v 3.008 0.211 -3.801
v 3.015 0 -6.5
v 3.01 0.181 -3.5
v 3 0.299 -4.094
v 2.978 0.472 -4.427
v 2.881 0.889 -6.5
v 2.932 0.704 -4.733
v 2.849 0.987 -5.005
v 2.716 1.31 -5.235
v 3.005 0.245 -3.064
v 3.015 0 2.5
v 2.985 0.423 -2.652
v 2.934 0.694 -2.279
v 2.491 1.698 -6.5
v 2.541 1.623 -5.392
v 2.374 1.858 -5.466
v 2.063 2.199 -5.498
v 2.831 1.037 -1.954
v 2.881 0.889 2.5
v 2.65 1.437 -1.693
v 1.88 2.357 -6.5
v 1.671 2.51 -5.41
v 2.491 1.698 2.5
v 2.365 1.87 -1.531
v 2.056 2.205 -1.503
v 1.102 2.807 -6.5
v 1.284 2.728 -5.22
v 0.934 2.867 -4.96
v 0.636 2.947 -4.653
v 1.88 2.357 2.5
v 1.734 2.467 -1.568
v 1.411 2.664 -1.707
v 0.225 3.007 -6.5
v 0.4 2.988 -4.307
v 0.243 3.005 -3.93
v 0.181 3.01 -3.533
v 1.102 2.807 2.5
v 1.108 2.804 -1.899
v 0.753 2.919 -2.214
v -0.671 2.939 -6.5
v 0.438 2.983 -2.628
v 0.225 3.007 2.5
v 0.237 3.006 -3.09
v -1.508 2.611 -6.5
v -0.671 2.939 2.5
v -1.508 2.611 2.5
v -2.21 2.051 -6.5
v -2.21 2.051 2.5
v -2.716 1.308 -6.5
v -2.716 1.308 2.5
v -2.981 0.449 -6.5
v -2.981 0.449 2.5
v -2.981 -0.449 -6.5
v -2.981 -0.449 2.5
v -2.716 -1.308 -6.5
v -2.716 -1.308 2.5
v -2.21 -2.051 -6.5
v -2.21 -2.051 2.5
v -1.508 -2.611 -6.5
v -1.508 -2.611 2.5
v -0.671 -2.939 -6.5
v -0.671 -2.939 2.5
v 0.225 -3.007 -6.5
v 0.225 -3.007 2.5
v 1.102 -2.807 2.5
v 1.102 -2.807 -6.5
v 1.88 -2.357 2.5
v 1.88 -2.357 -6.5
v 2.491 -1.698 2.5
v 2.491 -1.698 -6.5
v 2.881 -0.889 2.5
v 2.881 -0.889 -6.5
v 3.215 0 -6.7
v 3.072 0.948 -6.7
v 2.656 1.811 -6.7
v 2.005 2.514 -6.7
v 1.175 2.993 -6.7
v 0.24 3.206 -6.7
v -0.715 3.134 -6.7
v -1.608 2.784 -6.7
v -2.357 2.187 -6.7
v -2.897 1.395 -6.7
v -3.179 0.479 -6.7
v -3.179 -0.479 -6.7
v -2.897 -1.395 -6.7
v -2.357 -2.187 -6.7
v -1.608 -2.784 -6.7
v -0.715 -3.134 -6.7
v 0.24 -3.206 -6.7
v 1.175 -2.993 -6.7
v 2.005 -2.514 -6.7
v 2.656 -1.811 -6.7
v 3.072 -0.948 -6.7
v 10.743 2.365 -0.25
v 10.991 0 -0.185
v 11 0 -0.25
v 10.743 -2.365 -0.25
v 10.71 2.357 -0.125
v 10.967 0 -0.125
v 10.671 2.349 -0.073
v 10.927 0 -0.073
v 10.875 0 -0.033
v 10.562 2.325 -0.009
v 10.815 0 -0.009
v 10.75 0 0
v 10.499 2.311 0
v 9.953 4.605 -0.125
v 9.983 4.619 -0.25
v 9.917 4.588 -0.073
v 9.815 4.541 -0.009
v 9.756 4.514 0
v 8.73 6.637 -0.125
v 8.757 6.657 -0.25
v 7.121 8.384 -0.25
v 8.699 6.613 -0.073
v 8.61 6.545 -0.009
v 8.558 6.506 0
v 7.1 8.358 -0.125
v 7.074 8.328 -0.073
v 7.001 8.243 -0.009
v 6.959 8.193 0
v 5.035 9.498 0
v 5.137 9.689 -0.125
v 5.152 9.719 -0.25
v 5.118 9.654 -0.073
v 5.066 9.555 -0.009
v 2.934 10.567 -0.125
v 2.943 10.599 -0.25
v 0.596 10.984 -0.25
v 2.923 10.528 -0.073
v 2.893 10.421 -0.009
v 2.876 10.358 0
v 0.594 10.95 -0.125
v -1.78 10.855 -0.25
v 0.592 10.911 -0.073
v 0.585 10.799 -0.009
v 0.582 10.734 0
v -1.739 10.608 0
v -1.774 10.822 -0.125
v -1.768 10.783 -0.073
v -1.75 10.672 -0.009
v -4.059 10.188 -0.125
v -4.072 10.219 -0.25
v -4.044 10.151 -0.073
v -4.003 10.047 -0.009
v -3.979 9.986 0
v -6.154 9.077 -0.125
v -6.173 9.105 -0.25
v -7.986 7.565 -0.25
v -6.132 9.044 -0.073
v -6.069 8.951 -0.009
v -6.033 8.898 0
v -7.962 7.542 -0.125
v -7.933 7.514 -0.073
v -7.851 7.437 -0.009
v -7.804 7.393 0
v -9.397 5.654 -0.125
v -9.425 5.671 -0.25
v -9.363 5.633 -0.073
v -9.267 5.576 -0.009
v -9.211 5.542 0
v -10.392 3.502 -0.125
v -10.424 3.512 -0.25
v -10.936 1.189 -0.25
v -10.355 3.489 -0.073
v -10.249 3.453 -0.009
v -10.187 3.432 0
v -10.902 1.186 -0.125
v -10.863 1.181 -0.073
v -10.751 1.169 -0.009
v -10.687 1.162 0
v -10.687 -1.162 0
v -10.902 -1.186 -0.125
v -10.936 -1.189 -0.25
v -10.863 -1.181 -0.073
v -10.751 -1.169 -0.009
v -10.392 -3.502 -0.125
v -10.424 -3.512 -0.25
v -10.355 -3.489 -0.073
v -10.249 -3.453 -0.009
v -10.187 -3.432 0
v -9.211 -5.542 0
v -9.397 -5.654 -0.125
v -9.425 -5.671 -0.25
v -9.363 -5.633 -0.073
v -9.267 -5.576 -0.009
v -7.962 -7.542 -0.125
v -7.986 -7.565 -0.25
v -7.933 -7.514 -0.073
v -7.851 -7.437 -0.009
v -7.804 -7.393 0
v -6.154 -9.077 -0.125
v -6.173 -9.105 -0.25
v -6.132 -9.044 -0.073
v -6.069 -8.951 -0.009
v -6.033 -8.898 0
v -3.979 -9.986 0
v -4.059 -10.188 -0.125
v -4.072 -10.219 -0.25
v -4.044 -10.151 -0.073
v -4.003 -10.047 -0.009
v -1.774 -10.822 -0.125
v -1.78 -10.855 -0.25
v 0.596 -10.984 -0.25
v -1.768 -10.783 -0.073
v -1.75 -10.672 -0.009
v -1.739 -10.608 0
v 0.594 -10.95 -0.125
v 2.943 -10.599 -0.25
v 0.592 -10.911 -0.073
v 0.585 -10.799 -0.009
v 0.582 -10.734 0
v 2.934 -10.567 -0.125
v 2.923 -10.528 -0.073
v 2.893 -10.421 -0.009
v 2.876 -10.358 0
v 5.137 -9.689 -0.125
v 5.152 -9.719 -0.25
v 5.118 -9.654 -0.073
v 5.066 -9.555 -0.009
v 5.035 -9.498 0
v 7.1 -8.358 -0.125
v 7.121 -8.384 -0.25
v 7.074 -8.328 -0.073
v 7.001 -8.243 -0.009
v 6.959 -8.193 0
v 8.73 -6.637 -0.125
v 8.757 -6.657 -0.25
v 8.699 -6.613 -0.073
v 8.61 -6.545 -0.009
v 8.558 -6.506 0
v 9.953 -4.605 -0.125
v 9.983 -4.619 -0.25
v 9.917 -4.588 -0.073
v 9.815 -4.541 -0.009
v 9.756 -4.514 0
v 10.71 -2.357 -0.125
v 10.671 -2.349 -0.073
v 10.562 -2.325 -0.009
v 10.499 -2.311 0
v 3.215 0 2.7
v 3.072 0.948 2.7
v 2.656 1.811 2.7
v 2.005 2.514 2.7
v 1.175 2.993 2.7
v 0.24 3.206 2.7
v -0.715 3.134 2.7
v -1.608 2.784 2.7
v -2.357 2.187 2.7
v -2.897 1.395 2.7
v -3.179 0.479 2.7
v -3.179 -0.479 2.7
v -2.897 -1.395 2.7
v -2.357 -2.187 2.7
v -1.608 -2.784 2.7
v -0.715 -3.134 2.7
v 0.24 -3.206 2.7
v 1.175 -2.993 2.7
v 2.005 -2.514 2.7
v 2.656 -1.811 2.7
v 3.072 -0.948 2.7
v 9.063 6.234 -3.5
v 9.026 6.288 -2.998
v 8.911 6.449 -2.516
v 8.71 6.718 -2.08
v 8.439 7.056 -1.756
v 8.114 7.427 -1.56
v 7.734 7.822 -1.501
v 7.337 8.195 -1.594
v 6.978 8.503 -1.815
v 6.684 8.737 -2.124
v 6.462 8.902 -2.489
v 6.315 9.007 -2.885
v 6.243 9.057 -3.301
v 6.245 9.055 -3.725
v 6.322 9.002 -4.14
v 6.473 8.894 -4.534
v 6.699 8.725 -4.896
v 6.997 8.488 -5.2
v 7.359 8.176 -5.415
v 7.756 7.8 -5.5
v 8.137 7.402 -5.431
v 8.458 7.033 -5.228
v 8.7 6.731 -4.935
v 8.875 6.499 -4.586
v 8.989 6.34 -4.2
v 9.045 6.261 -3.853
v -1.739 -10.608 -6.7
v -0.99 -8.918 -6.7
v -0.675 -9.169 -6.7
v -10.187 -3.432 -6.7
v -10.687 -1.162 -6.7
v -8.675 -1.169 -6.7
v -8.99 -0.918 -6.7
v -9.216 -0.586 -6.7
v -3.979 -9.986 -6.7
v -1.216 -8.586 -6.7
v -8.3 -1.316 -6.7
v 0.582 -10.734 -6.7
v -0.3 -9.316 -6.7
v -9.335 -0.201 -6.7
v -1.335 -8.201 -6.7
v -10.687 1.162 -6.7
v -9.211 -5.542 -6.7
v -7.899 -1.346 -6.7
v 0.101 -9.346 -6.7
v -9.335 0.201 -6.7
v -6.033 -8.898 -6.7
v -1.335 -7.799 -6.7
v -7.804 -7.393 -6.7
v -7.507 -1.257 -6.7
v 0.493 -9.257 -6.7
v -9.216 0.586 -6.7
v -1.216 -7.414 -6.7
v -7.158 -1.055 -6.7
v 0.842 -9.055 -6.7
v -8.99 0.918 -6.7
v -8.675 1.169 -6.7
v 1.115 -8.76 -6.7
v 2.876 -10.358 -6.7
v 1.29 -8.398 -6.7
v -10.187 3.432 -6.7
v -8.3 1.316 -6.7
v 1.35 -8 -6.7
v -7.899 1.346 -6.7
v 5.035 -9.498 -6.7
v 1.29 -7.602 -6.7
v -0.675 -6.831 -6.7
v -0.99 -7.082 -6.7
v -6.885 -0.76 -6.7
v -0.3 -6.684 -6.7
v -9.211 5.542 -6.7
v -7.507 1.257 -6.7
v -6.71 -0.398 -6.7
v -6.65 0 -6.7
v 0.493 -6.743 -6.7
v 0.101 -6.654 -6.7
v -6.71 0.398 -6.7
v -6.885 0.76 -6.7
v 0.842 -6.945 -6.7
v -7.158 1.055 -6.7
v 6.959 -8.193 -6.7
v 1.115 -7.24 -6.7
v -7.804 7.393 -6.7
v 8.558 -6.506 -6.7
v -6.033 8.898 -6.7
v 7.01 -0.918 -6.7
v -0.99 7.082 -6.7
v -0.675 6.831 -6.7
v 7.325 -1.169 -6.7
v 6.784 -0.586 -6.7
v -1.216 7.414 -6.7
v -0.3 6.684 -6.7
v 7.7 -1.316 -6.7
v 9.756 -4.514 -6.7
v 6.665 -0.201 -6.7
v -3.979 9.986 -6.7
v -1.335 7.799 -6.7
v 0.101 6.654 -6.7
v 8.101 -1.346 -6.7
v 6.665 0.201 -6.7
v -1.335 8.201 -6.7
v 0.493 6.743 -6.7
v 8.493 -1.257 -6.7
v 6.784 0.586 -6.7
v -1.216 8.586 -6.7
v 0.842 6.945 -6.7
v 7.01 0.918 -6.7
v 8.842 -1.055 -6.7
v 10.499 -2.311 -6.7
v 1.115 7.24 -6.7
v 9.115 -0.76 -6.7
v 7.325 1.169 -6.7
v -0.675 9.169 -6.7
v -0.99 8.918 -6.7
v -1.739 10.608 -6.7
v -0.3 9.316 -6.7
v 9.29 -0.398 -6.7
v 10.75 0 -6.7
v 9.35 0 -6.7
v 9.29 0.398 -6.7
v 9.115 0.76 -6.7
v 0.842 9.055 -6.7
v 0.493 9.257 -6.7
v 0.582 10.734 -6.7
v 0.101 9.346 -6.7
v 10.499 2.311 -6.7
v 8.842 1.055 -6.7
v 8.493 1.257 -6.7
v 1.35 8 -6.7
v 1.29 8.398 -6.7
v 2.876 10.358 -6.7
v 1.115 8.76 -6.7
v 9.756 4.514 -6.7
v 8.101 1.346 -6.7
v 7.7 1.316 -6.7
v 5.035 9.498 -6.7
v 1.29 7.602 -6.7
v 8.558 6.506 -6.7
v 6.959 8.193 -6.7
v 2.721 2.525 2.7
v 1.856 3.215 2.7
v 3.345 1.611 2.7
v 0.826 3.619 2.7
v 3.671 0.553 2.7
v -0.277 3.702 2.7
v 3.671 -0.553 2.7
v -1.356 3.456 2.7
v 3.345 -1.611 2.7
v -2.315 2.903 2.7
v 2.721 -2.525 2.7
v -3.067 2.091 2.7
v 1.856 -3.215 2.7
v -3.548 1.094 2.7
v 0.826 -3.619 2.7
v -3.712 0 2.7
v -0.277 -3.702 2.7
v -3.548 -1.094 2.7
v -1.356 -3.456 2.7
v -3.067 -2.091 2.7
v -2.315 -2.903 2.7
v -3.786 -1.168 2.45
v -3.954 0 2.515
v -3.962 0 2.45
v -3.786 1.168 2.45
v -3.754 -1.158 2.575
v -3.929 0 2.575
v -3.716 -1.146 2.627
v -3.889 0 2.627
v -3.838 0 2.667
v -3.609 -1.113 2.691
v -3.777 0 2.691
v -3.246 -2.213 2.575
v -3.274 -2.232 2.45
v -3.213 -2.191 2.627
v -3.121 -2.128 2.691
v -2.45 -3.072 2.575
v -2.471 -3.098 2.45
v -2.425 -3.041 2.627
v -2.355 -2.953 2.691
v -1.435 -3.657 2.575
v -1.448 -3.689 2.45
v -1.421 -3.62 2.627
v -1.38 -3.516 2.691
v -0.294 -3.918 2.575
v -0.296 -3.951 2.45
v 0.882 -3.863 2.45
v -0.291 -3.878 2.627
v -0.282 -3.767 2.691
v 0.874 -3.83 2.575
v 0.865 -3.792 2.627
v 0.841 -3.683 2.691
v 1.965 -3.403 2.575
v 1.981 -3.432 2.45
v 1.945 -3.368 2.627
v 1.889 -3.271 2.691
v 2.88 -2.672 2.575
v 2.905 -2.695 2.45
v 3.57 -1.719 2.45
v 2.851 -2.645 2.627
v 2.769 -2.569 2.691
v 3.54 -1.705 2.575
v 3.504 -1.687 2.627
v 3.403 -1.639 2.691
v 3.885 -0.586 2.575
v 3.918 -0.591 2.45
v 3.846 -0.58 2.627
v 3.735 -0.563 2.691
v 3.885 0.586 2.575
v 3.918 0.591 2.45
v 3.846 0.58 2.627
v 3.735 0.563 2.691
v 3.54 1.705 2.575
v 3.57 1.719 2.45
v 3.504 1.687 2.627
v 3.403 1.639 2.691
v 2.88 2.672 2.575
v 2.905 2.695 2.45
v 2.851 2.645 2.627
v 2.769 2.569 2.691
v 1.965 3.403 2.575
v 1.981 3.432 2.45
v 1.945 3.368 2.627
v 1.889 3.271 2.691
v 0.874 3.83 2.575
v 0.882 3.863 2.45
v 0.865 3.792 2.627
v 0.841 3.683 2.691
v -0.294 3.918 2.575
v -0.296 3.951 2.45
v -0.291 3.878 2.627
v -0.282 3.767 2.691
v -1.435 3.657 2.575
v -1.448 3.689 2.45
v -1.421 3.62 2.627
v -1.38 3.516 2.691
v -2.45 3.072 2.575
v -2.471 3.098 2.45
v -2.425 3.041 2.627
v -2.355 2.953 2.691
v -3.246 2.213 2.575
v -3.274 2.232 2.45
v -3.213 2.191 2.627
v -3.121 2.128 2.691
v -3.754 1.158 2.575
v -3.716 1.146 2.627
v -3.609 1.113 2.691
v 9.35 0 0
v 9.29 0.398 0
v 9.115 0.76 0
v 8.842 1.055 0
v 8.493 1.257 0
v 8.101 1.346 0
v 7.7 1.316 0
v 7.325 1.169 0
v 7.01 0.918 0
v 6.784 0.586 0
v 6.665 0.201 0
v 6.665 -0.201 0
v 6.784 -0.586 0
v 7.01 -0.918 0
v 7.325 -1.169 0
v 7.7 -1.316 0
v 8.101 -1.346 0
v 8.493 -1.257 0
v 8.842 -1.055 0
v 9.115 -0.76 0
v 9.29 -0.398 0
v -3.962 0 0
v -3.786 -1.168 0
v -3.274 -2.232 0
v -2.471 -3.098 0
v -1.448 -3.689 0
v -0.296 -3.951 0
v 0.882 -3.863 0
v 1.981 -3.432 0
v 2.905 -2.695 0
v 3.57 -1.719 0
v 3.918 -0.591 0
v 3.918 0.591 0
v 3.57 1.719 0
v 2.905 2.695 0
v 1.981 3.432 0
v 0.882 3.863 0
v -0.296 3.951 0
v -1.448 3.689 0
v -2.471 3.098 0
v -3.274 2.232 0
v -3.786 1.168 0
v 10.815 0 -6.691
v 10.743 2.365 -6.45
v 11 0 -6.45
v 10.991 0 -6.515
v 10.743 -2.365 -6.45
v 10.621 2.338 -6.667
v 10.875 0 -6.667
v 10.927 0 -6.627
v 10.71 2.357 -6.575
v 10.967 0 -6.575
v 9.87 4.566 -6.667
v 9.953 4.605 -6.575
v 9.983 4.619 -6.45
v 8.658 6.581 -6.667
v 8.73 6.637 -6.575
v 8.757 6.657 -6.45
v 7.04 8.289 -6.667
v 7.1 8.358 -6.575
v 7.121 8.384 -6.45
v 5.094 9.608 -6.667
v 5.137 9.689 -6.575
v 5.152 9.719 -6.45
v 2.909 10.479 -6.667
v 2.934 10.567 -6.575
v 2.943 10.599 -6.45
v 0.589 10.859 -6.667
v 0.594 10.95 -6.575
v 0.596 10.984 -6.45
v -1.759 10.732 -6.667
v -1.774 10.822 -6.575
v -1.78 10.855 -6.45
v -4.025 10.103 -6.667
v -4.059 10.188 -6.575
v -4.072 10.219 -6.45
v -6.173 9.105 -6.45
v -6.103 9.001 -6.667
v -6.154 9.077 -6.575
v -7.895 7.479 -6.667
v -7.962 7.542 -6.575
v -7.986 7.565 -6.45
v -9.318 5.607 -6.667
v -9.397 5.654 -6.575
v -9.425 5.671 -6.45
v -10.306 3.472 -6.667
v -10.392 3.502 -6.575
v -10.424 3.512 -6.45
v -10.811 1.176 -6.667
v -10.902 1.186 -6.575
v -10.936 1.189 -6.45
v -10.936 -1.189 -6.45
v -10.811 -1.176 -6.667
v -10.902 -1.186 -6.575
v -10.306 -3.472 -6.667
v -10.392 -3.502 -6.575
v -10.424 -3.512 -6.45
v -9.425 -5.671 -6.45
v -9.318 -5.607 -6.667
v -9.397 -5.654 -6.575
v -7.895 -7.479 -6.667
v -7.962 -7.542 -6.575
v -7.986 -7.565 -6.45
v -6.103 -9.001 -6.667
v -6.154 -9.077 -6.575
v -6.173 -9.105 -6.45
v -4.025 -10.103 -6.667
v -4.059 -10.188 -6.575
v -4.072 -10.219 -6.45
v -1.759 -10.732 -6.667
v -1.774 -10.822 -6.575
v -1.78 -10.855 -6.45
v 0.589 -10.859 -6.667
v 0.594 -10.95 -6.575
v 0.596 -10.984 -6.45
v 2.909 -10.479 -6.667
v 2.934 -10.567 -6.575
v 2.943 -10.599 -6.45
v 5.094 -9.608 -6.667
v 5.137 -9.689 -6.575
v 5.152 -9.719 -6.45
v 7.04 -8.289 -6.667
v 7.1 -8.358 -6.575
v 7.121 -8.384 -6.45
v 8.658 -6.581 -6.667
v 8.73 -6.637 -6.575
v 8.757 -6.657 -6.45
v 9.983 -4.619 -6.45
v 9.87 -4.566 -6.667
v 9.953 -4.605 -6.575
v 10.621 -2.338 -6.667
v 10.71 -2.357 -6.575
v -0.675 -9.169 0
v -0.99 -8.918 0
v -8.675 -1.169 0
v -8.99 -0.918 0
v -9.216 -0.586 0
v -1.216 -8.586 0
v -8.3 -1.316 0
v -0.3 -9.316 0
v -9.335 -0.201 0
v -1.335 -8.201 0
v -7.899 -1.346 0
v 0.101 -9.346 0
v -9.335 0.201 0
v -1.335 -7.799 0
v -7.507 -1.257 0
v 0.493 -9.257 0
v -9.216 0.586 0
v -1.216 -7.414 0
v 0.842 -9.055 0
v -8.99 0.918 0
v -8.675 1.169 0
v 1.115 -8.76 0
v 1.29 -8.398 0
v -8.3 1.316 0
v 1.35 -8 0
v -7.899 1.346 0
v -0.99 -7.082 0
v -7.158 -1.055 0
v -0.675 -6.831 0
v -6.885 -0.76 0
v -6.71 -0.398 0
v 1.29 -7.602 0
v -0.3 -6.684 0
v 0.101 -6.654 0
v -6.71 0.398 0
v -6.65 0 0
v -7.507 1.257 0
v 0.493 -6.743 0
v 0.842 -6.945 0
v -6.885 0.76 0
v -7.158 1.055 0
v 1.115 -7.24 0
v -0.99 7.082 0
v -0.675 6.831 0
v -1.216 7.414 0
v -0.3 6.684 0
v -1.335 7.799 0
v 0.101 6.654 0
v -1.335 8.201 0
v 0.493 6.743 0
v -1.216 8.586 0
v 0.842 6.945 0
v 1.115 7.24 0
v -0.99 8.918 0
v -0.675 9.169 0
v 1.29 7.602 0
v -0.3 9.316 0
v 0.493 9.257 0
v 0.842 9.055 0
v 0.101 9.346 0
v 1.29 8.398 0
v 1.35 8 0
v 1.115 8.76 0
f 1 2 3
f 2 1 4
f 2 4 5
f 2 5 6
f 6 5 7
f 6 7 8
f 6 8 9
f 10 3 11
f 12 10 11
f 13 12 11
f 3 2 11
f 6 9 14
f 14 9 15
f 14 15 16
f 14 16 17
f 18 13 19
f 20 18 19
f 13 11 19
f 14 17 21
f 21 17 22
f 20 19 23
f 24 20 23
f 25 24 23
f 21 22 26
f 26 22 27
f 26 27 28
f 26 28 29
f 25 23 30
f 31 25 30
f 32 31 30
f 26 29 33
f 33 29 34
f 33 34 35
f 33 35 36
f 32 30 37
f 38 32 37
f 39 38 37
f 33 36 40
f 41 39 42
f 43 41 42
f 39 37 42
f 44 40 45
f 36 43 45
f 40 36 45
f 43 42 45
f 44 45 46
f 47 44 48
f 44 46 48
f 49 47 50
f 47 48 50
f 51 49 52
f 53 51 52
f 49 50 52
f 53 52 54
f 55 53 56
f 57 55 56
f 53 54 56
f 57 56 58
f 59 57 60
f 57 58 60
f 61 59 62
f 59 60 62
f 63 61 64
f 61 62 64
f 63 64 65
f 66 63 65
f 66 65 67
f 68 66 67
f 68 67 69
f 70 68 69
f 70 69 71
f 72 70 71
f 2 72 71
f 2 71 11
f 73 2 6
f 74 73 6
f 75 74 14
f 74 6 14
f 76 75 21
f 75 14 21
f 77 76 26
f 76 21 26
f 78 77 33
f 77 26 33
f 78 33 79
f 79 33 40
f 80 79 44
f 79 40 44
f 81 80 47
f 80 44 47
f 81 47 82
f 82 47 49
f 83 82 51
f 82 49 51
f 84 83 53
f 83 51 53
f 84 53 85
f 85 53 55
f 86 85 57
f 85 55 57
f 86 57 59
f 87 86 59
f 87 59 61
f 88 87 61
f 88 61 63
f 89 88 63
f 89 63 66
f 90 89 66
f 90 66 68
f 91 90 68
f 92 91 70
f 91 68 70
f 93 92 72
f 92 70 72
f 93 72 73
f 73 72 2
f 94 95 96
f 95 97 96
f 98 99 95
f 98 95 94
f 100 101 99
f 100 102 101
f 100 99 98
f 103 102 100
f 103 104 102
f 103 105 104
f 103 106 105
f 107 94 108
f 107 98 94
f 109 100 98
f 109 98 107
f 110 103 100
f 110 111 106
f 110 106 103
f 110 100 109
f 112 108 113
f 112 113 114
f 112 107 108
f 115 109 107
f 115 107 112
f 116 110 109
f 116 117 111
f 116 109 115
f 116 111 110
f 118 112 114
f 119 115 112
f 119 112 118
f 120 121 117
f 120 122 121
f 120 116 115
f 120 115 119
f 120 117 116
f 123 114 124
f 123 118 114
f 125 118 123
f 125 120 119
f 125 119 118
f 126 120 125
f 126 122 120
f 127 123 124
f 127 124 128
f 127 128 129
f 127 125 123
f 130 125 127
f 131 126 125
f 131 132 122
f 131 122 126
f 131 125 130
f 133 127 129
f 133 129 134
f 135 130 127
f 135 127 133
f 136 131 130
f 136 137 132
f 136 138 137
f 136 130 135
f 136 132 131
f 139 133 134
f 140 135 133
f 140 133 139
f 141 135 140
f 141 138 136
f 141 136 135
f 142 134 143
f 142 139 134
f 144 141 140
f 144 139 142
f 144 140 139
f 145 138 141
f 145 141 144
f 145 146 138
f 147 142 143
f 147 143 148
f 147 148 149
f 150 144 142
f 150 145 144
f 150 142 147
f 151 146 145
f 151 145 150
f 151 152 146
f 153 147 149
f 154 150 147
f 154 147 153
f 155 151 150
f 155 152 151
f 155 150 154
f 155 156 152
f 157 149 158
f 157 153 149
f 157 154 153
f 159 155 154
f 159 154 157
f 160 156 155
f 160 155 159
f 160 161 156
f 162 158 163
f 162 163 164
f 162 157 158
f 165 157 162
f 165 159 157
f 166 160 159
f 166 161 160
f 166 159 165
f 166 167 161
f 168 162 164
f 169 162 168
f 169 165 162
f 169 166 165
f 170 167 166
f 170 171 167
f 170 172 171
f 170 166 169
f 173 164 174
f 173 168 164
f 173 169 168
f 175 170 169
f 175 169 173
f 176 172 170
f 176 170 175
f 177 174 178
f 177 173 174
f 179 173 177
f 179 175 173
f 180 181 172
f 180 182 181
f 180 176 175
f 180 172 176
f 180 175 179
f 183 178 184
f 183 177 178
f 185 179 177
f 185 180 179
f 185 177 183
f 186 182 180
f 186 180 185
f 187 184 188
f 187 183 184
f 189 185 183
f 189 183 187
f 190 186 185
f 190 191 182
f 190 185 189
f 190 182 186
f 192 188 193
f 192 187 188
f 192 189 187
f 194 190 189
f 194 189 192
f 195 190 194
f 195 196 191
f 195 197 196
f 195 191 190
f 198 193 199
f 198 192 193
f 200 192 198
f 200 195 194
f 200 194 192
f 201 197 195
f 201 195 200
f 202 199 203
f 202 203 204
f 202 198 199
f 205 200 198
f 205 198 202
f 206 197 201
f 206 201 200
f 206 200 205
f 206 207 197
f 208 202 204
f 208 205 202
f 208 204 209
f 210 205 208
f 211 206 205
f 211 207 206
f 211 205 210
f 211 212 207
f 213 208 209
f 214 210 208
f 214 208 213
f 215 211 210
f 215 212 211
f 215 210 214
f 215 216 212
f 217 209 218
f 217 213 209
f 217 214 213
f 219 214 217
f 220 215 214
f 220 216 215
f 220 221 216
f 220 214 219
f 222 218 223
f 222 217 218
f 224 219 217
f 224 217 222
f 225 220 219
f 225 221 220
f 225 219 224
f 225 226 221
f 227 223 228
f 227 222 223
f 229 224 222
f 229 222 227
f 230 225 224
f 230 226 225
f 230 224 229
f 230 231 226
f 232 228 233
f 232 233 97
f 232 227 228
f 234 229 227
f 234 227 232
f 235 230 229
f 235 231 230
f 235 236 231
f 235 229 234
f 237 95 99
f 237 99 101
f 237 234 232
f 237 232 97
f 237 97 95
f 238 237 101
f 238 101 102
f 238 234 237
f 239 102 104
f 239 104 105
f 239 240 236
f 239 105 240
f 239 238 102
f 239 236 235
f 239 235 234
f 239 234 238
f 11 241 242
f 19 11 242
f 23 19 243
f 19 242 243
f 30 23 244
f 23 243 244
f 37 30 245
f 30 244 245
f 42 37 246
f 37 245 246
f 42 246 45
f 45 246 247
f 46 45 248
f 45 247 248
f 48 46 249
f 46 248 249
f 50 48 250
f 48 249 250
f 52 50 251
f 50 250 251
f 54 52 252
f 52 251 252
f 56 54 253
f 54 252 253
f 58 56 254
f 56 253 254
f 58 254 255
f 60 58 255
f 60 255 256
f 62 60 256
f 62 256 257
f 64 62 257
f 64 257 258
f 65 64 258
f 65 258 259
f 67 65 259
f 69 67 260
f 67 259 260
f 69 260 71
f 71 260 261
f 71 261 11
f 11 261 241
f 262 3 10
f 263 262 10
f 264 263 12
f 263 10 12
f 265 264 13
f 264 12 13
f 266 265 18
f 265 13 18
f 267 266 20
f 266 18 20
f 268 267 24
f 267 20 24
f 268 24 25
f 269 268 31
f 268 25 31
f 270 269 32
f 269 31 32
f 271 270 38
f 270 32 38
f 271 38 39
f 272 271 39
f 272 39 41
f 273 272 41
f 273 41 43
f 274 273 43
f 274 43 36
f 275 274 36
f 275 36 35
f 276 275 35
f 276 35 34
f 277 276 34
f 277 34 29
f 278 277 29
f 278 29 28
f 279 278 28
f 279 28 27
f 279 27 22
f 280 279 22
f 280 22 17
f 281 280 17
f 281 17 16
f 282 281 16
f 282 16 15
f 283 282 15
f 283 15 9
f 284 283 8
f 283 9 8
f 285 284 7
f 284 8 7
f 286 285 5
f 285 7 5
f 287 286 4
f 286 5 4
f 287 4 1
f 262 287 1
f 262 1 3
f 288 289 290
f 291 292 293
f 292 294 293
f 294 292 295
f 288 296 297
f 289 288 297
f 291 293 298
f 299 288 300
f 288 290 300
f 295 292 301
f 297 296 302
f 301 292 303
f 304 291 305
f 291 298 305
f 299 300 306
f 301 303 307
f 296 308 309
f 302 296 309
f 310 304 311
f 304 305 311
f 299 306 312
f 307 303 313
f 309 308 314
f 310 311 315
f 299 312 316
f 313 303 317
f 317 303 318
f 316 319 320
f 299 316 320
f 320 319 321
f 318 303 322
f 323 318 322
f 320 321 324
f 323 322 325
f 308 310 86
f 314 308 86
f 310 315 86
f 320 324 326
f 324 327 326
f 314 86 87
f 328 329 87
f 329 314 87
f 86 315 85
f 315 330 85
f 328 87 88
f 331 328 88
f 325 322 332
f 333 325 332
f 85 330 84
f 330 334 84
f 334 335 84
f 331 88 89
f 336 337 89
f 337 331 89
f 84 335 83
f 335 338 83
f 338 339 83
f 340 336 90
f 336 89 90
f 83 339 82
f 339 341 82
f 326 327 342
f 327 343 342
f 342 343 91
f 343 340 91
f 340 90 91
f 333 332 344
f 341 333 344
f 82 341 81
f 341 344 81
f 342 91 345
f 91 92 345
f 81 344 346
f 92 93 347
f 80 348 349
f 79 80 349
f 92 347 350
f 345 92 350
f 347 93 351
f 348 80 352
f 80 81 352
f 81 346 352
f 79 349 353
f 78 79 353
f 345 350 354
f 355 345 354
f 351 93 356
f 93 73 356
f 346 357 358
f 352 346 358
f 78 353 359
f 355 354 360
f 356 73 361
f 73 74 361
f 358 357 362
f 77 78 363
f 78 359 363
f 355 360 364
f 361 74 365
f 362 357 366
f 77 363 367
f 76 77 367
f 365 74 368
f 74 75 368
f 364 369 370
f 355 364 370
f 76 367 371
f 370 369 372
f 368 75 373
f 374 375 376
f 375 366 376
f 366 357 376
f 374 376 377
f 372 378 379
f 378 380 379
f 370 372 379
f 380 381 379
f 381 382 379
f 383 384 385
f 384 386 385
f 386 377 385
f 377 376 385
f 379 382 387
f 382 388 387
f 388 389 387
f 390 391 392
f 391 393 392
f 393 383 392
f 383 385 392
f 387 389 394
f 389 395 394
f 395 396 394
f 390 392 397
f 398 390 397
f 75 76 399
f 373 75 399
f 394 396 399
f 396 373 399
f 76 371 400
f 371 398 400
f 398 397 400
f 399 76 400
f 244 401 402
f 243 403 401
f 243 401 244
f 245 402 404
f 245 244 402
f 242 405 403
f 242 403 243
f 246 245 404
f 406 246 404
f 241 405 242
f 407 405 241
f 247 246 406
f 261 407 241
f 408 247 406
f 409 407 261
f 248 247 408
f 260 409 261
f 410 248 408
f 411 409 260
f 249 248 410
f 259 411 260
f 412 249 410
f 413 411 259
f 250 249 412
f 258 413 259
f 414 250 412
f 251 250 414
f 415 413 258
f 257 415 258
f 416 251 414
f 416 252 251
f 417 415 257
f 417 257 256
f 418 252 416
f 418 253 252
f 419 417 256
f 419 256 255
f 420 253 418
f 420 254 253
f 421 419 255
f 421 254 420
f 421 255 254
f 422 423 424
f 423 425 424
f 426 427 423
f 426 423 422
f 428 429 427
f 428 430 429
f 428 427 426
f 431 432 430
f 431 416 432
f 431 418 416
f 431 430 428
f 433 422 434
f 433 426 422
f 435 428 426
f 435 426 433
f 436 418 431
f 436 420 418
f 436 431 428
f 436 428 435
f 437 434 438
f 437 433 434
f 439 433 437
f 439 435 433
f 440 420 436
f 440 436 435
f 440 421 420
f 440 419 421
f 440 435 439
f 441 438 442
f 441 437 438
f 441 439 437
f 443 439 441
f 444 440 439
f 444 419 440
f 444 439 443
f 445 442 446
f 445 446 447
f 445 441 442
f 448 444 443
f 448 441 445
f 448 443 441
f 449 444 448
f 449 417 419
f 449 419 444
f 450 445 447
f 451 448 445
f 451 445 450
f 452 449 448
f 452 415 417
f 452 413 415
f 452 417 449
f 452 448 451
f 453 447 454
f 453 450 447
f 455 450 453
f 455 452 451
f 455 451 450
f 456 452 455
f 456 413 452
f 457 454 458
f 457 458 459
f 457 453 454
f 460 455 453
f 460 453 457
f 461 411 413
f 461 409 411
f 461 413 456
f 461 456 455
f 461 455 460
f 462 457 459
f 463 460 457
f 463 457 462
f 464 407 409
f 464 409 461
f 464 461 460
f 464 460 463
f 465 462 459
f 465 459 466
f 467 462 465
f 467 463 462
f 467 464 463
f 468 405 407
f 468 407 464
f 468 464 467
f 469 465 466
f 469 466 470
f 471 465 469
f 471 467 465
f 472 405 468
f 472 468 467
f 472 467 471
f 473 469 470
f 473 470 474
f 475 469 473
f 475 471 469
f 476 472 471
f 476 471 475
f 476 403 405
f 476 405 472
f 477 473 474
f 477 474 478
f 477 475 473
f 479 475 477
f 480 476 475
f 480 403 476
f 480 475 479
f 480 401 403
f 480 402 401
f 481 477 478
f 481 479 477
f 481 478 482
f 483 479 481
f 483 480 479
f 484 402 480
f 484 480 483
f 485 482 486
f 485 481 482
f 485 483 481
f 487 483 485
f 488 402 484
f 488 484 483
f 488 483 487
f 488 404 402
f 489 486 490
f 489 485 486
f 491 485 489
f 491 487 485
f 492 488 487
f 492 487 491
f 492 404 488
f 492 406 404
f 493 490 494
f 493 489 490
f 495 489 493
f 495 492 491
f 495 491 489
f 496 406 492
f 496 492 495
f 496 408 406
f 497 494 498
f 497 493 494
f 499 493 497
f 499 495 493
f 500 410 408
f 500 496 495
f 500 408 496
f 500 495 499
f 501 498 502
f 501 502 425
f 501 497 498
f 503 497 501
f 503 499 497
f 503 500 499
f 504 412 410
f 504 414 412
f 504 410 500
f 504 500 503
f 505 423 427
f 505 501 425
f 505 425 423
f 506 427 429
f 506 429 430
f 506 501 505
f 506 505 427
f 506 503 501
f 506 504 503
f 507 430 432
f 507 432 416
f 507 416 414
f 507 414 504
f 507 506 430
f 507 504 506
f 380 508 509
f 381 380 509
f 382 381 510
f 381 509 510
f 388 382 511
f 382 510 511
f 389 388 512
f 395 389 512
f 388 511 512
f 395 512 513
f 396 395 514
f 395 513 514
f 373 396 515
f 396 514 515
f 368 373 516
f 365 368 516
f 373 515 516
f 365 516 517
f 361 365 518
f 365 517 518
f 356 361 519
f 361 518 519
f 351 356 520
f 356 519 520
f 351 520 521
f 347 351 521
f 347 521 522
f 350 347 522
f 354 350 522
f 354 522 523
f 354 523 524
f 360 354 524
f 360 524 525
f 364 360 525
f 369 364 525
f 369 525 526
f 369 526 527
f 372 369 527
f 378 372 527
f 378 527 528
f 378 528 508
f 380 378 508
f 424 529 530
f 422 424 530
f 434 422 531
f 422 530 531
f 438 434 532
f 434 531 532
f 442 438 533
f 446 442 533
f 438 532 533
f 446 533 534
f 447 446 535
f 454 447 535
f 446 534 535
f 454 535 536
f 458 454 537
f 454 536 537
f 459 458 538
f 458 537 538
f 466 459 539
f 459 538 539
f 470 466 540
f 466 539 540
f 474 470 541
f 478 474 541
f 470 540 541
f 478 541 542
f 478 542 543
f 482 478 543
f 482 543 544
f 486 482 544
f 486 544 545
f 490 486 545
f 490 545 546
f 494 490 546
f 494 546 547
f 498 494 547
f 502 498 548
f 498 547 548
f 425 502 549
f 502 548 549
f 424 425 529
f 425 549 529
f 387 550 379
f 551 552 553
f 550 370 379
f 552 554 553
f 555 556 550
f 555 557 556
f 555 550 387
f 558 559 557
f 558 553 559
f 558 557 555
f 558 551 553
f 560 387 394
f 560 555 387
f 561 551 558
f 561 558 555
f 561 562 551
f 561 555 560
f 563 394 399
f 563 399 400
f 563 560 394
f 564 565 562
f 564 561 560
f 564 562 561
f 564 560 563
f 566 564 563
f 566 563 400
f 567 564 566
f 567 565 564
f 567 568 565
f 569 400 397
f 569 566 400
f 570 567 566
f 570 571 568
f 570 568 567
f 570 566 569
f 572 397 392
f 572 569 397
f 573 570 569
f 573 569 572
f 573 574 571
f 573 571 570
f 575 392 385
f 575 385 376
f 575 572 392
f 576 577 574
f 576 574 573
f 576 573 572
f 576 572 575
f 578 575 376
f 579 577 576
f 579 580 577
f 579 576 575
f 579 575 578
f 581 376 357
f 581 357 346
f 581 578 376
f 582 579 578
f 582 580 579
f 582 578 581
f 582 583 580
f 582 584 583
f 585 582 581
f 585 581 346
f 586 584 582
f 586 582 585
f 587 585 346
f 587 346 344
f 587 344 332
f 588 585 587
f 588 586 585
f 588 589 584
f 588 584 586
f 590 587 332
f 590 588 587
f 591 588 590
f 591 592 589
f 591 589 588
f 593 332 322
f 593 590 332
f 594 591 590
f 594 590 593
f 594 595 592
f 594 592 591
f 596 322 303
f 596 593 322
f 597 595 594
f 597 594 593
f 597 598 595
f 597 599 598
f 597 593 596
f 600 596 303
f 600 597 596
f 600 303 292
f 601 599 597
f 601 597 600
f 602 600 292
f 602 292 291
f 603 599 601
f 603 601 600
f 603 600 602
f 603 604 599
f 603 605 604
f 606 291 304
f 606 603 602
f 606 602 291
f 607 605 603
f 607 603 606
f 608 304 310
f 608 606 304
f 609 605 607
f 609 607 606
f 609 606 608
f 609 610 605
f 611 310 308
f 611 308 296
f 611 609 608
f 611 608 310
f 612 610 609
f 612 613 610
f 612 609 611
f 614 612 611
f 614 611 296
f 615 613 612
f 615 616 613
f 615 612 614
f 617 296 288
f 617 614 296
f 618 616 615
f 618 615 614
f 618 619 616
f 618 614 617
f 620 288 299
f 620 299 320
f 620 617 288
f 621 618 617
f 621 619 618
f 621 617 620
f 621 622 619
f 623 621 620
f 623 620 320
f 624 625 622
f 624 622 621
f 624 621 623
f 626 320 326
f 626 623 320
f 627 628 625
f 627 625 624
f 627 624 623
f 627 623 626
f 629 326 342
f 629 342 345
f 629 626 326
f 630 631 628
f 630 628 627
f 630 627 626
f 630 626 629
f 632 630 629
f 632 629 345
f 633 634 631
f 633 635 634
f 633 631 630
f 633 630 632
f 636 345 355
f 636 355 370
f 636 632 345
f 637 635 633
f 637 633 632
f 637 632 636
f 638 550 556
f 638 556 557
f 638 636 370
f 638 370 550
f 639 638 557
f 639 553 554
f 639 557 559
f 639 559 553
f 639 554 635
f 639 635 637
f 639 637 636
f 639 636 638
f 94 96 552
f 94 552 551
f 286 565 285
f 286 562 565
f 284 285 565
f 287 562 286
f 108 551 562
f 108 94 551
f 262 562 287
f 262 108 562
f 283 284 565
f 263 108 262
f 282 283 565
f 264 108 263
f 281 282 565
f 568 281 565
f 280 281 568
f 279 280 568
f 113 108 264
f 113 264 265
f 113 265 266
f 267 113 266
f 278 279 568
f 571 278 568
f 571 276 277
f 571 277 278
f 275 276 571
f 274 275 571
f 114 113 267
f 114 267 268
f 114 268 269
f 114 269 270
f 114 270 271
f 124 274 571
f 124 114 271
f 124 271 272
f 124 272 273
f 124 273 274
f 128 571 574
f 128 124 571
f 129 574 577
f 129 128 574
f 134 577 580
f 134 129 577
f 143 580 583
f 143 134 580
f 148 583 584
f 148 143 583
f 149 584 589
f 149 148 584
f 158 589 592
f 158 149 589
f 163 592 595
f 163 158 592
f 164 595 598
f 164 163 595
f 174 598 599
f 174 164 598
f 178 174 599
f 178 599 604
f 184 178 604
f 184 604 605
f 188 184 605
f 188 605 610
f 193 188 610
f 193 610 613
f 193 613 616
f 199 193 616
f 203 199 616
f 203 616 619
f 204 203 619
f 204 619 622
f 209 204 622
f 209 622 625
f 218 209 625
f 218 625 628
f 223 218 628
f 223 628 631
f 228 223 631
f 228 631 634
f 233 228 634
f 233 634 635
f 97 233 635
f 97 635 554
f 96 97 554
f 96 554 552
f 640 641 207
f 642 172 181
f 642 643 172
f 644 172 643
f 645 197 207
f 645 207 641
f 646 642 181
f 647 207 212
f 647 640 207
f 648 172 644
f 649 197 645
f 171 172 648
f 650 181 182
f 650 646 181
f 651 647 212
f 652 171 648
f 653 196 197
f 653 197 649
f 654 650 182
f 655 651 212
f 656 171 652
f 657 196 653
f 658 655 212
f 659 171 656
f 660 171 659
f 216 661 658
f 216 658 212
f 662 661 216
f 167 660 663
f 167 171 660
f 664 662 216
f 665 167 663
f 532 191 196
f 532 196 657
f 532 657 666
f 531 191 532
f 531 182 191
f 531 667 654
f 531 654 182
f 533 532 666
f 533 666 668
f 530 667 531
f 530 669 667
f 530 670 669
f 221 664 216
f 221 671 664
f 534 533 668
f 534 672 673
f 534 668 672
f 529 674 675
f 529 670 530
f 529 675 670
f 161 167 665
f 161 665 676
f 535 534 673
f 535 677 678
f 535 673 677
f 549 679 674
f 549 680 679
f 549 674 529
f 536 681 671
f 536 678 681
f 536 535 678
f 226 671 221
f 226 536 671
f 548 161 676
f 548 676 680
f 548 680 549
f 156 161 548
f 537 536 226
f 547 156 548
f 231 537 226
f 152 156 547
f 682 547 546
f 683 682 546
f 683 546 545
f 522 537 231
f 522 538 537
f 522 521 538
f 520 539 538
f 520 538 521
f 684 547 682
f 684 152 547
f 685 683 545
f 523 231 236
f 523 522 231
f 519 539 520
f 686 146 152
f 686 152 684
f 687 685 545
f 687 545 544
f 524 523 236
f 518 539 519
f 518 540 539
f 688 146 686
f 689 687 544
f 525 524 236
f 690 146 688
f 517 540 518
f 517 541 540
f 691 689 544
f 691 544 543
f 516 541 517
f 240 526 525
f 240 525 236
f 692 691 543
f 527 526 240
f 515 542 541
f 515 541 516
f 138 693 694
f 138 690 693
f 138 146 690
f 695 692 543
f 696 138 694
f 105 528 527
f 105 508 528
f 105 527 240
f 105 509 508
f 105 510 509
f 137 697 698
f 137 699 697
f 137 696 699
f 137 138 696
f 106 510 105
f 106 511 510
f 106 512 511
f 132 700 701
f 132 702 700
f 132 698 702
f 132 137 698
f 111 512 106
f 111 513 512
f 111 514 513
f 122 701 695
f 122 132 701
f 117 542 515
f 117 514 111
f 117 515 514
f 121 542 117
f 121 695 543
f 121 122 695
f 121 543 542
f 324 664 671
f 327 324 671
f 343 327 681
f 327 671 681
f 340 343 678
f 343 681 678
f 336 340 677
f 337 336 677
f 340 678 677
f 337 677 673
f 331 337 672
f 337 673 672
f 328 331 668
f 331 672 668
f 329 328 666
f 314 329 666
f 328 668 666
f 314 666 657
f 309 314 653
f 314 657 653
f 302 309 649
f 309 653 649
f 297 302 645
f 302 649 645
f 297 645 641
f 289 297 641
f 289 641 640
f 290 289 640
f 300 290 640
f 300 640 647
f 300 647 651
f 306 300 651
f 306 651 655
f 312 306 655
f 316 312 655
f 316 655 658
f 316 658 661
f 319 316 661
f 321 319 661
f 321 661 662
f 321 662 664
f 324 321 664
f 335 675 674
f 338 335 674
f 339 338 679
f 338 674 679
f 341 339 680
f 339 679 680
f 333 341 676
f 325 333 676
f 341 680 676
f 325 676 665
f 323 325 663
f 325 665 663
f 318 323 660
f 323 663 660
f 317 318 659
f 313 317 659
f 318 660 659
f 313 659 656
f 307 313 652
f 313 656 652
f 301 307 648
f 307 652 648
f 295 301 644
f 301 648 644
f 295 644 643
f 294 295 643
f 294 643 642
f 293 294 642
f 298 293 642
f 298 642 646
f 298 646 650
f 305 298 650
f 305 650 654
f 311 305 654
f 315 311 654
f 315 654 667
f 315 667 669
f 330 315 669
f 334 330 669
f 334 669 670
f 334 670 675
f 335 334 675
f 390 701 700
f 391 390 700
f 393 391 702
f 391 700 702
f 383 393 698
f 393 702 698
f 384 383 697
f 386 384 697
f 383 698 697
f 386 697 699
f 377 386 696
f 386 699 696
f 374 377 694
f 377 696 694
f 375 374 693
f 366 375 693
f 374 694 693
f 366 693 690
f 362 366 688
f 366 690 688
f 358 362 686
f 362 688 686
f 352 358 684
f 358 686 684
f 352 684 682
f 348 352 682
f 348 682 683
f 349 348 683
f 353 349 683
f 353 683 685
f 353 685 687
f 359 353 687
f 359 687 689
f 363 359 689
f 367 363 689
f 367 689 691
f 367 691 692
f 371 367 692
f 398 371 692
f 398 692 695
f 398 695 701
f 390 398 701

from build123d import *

# Parameters (mm, degrees)
SKETCH1_R           = 11
BOSS_EXTRUDE1_DEPTH = 6.7
SKETCH2_R           = 3.9625
BOSS_EXTRUDE2_DEPTH = 2.7
SKETCH3_R           = 3.015
CUT_EXTRUDE1_DEPTH  = 19.175808098
SKETCH4_R           = 1.35
CUT_EXTRUDE2_DEPTH  = 17.937827488
SKETCH6_R           = 2
CUT_EXTRUDE3_DEPTH  = 17.937827488
CHAMFER1_SIZE       = 0.2
FILLET1_R           = 0.25


with BuildPart() as part:
    # Sketch1 → Boss-Extrude1 (new body)
    with BuildSketch(Plane.XY):
        Circle(SKETCH1_R)
    extrude(amount=-BOSS_EXTRUDE1_DEPTH)

    # Sketch2 → Boss-Extrude2 (add)
    with BuildSketch(Plane.XY):
        with Locations(Location((0, 0, 0), (0, 0, 180))):
            Circle(SKETCH2_R)
    extrude(amount=BOSS_EXTRUDE2_DEPTH)

    # Sketch3 → Cut-Extrude1 (cut, through all)
    with BuildSketch(Plane.XY.offset(2.7)):
        Circle(SKETCH3_R)
    extrude(amount=-CUT_EXTRUDE1_DEPTH, mode=Mode.SUBTRACT)

    # Sketch4 → Cut-Extrude2 (cut, through all)
    with BuildSketch(Plane.XY):
        with Locations((0, 8)):
            Circle(SKETCH4_R)
        with Locations((8, 0)):
            Circle(SKETCH4_R)
        with Locations((0, -8)):
            Circle(SKETCH4_R)
        with Locations((-8, 0)):
            Circle(SKETCH4_R)
    extrude(amount=-CUT_EXTRUDE2_DEPTH, mode=Mode.SUBTRACT)

    # Sketch6 → Cut-Extrude3 (cut, through all)
    with BuildSketch(Plane(origin=(0, 0, 0), x_dir=(0, 0, 1), z_dir=(-0.7071067811865487, -0.7071067811865465, 0))):
        with Locations(Location((-3.5, 0, 0), (0, 0, 270))):
            Circle(SKETCH6_R)
    extrude(amount=-CUT_EXTRUDE3_DEPTH, mode=Mode.SUBTRACT)

    # Chamfer1
    chamfer1_edges = [part.edges().sort_by_distance(p)[0] for p in [
        (-3.015, 0, -6.7),
        (-3.015, 0, 2.7),
    ]]
    chamfer(chamfer1_edges, length=CHAMFER1_SIZE)

    # Fillet1
    fillet1_edges = [part.edges().sort_by_distance(p)[0] for p in [
        (-11, 0, 0),
        (-11, 0, -6.7),
        (3.9625, 0, 2.7),
    ]]
    fillet(fillet1_edges, radius=FILLET1_R)


solid = part.part
